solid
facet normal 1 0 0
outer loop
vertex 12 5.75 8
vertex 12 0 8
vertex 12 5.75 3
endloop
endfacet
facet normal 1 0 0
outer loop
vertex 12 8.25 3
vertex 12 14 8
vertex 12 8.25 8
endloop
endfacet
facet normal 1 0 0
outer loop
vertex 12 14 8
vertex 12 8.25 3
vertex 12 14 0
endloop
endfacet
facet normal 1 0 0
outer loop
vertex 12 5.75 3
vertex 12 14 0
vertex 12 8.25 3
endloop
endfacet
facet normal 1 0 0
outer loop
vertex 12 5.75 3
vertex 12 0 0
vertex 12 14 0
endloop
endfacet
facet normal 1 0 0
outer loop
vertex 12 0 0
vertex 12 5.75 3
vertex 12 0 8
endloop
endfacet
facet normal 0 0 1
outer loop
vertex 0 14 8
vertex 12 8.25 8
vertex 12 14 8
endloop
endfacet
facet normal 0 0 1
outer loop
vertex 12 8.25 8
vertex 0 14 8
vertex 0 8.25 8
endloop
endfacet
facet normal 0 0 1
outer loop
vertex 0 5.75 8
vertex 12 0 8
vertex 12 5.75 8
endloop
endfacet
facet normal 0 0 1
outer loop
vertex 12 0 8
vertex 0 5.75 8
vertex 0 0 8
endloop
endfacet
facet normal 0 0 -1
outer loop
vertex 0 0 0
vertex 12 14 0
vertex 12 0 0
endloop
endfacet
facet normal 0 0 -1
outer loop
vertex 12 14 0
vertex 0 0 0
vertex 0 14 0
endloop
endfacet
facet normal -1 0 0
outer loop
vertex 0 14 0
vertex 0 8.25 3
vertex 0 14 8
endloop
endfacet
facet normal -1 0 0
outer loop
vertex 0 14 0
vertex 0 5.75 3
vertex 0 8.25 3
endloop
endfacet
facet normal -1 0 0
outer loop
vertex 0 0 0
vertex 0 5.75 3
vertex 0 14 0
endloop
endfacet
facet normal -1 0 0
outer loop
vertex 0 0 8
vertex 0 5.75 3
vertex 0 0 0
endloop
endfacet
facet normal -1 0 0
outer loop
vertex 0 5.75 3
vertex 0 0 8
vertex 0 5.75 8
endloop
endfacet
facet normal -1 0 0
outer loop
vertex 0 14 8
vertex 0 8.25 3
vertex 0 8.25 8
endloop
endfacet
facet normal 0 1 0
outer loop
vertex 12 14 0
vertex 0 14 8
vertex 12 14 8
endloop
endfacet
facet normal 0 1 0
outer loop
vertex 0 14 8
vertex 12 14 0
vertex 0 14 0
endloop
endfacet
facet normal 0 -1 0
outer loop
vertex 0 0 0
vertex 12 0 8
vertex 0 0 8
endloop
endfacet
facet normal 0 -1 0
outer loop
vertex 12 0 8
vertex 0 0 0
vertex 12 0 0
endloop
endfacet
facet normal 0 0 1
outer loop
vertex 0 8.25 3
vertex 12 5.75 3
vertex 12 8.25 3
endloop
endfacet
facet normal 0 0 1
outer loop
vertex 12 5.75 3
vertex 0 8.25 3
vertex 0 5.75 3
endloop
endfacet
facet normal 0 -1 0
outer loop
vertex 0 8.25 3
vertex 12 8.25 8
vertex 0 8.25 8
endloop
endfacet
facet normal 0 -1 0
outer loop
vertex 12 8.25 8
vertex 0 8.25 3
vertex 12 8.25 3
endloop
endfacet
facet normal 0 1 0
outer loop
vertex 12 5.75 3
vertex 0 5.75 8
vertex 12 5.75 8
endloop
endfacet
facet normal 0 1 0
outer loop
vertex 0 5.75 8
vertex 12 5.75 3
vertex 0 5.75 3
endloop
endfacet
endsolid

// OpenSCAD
$fn = 32;

// ----------------------------------------------------------------------
// Micro clip: slotted block, 5-20 mm class
// ----------------------------------------------------------------------

// --- parameters (mm) ---
block_l = 12;             // block length, X
block_w = 14;             // block width, Y
block_h = 8;              // block height, Z
slot_w = 2.5;             // slot width
slot_d = 5;               // slot depth from the top

difference() {
  cube([block_l, block_w, block_h]);
  translate([-1, block_w / 2 - slot_w / 2, block_h - slot_d])
    cube([block_l + 2, slot_w, slot_d + 1]);
}
